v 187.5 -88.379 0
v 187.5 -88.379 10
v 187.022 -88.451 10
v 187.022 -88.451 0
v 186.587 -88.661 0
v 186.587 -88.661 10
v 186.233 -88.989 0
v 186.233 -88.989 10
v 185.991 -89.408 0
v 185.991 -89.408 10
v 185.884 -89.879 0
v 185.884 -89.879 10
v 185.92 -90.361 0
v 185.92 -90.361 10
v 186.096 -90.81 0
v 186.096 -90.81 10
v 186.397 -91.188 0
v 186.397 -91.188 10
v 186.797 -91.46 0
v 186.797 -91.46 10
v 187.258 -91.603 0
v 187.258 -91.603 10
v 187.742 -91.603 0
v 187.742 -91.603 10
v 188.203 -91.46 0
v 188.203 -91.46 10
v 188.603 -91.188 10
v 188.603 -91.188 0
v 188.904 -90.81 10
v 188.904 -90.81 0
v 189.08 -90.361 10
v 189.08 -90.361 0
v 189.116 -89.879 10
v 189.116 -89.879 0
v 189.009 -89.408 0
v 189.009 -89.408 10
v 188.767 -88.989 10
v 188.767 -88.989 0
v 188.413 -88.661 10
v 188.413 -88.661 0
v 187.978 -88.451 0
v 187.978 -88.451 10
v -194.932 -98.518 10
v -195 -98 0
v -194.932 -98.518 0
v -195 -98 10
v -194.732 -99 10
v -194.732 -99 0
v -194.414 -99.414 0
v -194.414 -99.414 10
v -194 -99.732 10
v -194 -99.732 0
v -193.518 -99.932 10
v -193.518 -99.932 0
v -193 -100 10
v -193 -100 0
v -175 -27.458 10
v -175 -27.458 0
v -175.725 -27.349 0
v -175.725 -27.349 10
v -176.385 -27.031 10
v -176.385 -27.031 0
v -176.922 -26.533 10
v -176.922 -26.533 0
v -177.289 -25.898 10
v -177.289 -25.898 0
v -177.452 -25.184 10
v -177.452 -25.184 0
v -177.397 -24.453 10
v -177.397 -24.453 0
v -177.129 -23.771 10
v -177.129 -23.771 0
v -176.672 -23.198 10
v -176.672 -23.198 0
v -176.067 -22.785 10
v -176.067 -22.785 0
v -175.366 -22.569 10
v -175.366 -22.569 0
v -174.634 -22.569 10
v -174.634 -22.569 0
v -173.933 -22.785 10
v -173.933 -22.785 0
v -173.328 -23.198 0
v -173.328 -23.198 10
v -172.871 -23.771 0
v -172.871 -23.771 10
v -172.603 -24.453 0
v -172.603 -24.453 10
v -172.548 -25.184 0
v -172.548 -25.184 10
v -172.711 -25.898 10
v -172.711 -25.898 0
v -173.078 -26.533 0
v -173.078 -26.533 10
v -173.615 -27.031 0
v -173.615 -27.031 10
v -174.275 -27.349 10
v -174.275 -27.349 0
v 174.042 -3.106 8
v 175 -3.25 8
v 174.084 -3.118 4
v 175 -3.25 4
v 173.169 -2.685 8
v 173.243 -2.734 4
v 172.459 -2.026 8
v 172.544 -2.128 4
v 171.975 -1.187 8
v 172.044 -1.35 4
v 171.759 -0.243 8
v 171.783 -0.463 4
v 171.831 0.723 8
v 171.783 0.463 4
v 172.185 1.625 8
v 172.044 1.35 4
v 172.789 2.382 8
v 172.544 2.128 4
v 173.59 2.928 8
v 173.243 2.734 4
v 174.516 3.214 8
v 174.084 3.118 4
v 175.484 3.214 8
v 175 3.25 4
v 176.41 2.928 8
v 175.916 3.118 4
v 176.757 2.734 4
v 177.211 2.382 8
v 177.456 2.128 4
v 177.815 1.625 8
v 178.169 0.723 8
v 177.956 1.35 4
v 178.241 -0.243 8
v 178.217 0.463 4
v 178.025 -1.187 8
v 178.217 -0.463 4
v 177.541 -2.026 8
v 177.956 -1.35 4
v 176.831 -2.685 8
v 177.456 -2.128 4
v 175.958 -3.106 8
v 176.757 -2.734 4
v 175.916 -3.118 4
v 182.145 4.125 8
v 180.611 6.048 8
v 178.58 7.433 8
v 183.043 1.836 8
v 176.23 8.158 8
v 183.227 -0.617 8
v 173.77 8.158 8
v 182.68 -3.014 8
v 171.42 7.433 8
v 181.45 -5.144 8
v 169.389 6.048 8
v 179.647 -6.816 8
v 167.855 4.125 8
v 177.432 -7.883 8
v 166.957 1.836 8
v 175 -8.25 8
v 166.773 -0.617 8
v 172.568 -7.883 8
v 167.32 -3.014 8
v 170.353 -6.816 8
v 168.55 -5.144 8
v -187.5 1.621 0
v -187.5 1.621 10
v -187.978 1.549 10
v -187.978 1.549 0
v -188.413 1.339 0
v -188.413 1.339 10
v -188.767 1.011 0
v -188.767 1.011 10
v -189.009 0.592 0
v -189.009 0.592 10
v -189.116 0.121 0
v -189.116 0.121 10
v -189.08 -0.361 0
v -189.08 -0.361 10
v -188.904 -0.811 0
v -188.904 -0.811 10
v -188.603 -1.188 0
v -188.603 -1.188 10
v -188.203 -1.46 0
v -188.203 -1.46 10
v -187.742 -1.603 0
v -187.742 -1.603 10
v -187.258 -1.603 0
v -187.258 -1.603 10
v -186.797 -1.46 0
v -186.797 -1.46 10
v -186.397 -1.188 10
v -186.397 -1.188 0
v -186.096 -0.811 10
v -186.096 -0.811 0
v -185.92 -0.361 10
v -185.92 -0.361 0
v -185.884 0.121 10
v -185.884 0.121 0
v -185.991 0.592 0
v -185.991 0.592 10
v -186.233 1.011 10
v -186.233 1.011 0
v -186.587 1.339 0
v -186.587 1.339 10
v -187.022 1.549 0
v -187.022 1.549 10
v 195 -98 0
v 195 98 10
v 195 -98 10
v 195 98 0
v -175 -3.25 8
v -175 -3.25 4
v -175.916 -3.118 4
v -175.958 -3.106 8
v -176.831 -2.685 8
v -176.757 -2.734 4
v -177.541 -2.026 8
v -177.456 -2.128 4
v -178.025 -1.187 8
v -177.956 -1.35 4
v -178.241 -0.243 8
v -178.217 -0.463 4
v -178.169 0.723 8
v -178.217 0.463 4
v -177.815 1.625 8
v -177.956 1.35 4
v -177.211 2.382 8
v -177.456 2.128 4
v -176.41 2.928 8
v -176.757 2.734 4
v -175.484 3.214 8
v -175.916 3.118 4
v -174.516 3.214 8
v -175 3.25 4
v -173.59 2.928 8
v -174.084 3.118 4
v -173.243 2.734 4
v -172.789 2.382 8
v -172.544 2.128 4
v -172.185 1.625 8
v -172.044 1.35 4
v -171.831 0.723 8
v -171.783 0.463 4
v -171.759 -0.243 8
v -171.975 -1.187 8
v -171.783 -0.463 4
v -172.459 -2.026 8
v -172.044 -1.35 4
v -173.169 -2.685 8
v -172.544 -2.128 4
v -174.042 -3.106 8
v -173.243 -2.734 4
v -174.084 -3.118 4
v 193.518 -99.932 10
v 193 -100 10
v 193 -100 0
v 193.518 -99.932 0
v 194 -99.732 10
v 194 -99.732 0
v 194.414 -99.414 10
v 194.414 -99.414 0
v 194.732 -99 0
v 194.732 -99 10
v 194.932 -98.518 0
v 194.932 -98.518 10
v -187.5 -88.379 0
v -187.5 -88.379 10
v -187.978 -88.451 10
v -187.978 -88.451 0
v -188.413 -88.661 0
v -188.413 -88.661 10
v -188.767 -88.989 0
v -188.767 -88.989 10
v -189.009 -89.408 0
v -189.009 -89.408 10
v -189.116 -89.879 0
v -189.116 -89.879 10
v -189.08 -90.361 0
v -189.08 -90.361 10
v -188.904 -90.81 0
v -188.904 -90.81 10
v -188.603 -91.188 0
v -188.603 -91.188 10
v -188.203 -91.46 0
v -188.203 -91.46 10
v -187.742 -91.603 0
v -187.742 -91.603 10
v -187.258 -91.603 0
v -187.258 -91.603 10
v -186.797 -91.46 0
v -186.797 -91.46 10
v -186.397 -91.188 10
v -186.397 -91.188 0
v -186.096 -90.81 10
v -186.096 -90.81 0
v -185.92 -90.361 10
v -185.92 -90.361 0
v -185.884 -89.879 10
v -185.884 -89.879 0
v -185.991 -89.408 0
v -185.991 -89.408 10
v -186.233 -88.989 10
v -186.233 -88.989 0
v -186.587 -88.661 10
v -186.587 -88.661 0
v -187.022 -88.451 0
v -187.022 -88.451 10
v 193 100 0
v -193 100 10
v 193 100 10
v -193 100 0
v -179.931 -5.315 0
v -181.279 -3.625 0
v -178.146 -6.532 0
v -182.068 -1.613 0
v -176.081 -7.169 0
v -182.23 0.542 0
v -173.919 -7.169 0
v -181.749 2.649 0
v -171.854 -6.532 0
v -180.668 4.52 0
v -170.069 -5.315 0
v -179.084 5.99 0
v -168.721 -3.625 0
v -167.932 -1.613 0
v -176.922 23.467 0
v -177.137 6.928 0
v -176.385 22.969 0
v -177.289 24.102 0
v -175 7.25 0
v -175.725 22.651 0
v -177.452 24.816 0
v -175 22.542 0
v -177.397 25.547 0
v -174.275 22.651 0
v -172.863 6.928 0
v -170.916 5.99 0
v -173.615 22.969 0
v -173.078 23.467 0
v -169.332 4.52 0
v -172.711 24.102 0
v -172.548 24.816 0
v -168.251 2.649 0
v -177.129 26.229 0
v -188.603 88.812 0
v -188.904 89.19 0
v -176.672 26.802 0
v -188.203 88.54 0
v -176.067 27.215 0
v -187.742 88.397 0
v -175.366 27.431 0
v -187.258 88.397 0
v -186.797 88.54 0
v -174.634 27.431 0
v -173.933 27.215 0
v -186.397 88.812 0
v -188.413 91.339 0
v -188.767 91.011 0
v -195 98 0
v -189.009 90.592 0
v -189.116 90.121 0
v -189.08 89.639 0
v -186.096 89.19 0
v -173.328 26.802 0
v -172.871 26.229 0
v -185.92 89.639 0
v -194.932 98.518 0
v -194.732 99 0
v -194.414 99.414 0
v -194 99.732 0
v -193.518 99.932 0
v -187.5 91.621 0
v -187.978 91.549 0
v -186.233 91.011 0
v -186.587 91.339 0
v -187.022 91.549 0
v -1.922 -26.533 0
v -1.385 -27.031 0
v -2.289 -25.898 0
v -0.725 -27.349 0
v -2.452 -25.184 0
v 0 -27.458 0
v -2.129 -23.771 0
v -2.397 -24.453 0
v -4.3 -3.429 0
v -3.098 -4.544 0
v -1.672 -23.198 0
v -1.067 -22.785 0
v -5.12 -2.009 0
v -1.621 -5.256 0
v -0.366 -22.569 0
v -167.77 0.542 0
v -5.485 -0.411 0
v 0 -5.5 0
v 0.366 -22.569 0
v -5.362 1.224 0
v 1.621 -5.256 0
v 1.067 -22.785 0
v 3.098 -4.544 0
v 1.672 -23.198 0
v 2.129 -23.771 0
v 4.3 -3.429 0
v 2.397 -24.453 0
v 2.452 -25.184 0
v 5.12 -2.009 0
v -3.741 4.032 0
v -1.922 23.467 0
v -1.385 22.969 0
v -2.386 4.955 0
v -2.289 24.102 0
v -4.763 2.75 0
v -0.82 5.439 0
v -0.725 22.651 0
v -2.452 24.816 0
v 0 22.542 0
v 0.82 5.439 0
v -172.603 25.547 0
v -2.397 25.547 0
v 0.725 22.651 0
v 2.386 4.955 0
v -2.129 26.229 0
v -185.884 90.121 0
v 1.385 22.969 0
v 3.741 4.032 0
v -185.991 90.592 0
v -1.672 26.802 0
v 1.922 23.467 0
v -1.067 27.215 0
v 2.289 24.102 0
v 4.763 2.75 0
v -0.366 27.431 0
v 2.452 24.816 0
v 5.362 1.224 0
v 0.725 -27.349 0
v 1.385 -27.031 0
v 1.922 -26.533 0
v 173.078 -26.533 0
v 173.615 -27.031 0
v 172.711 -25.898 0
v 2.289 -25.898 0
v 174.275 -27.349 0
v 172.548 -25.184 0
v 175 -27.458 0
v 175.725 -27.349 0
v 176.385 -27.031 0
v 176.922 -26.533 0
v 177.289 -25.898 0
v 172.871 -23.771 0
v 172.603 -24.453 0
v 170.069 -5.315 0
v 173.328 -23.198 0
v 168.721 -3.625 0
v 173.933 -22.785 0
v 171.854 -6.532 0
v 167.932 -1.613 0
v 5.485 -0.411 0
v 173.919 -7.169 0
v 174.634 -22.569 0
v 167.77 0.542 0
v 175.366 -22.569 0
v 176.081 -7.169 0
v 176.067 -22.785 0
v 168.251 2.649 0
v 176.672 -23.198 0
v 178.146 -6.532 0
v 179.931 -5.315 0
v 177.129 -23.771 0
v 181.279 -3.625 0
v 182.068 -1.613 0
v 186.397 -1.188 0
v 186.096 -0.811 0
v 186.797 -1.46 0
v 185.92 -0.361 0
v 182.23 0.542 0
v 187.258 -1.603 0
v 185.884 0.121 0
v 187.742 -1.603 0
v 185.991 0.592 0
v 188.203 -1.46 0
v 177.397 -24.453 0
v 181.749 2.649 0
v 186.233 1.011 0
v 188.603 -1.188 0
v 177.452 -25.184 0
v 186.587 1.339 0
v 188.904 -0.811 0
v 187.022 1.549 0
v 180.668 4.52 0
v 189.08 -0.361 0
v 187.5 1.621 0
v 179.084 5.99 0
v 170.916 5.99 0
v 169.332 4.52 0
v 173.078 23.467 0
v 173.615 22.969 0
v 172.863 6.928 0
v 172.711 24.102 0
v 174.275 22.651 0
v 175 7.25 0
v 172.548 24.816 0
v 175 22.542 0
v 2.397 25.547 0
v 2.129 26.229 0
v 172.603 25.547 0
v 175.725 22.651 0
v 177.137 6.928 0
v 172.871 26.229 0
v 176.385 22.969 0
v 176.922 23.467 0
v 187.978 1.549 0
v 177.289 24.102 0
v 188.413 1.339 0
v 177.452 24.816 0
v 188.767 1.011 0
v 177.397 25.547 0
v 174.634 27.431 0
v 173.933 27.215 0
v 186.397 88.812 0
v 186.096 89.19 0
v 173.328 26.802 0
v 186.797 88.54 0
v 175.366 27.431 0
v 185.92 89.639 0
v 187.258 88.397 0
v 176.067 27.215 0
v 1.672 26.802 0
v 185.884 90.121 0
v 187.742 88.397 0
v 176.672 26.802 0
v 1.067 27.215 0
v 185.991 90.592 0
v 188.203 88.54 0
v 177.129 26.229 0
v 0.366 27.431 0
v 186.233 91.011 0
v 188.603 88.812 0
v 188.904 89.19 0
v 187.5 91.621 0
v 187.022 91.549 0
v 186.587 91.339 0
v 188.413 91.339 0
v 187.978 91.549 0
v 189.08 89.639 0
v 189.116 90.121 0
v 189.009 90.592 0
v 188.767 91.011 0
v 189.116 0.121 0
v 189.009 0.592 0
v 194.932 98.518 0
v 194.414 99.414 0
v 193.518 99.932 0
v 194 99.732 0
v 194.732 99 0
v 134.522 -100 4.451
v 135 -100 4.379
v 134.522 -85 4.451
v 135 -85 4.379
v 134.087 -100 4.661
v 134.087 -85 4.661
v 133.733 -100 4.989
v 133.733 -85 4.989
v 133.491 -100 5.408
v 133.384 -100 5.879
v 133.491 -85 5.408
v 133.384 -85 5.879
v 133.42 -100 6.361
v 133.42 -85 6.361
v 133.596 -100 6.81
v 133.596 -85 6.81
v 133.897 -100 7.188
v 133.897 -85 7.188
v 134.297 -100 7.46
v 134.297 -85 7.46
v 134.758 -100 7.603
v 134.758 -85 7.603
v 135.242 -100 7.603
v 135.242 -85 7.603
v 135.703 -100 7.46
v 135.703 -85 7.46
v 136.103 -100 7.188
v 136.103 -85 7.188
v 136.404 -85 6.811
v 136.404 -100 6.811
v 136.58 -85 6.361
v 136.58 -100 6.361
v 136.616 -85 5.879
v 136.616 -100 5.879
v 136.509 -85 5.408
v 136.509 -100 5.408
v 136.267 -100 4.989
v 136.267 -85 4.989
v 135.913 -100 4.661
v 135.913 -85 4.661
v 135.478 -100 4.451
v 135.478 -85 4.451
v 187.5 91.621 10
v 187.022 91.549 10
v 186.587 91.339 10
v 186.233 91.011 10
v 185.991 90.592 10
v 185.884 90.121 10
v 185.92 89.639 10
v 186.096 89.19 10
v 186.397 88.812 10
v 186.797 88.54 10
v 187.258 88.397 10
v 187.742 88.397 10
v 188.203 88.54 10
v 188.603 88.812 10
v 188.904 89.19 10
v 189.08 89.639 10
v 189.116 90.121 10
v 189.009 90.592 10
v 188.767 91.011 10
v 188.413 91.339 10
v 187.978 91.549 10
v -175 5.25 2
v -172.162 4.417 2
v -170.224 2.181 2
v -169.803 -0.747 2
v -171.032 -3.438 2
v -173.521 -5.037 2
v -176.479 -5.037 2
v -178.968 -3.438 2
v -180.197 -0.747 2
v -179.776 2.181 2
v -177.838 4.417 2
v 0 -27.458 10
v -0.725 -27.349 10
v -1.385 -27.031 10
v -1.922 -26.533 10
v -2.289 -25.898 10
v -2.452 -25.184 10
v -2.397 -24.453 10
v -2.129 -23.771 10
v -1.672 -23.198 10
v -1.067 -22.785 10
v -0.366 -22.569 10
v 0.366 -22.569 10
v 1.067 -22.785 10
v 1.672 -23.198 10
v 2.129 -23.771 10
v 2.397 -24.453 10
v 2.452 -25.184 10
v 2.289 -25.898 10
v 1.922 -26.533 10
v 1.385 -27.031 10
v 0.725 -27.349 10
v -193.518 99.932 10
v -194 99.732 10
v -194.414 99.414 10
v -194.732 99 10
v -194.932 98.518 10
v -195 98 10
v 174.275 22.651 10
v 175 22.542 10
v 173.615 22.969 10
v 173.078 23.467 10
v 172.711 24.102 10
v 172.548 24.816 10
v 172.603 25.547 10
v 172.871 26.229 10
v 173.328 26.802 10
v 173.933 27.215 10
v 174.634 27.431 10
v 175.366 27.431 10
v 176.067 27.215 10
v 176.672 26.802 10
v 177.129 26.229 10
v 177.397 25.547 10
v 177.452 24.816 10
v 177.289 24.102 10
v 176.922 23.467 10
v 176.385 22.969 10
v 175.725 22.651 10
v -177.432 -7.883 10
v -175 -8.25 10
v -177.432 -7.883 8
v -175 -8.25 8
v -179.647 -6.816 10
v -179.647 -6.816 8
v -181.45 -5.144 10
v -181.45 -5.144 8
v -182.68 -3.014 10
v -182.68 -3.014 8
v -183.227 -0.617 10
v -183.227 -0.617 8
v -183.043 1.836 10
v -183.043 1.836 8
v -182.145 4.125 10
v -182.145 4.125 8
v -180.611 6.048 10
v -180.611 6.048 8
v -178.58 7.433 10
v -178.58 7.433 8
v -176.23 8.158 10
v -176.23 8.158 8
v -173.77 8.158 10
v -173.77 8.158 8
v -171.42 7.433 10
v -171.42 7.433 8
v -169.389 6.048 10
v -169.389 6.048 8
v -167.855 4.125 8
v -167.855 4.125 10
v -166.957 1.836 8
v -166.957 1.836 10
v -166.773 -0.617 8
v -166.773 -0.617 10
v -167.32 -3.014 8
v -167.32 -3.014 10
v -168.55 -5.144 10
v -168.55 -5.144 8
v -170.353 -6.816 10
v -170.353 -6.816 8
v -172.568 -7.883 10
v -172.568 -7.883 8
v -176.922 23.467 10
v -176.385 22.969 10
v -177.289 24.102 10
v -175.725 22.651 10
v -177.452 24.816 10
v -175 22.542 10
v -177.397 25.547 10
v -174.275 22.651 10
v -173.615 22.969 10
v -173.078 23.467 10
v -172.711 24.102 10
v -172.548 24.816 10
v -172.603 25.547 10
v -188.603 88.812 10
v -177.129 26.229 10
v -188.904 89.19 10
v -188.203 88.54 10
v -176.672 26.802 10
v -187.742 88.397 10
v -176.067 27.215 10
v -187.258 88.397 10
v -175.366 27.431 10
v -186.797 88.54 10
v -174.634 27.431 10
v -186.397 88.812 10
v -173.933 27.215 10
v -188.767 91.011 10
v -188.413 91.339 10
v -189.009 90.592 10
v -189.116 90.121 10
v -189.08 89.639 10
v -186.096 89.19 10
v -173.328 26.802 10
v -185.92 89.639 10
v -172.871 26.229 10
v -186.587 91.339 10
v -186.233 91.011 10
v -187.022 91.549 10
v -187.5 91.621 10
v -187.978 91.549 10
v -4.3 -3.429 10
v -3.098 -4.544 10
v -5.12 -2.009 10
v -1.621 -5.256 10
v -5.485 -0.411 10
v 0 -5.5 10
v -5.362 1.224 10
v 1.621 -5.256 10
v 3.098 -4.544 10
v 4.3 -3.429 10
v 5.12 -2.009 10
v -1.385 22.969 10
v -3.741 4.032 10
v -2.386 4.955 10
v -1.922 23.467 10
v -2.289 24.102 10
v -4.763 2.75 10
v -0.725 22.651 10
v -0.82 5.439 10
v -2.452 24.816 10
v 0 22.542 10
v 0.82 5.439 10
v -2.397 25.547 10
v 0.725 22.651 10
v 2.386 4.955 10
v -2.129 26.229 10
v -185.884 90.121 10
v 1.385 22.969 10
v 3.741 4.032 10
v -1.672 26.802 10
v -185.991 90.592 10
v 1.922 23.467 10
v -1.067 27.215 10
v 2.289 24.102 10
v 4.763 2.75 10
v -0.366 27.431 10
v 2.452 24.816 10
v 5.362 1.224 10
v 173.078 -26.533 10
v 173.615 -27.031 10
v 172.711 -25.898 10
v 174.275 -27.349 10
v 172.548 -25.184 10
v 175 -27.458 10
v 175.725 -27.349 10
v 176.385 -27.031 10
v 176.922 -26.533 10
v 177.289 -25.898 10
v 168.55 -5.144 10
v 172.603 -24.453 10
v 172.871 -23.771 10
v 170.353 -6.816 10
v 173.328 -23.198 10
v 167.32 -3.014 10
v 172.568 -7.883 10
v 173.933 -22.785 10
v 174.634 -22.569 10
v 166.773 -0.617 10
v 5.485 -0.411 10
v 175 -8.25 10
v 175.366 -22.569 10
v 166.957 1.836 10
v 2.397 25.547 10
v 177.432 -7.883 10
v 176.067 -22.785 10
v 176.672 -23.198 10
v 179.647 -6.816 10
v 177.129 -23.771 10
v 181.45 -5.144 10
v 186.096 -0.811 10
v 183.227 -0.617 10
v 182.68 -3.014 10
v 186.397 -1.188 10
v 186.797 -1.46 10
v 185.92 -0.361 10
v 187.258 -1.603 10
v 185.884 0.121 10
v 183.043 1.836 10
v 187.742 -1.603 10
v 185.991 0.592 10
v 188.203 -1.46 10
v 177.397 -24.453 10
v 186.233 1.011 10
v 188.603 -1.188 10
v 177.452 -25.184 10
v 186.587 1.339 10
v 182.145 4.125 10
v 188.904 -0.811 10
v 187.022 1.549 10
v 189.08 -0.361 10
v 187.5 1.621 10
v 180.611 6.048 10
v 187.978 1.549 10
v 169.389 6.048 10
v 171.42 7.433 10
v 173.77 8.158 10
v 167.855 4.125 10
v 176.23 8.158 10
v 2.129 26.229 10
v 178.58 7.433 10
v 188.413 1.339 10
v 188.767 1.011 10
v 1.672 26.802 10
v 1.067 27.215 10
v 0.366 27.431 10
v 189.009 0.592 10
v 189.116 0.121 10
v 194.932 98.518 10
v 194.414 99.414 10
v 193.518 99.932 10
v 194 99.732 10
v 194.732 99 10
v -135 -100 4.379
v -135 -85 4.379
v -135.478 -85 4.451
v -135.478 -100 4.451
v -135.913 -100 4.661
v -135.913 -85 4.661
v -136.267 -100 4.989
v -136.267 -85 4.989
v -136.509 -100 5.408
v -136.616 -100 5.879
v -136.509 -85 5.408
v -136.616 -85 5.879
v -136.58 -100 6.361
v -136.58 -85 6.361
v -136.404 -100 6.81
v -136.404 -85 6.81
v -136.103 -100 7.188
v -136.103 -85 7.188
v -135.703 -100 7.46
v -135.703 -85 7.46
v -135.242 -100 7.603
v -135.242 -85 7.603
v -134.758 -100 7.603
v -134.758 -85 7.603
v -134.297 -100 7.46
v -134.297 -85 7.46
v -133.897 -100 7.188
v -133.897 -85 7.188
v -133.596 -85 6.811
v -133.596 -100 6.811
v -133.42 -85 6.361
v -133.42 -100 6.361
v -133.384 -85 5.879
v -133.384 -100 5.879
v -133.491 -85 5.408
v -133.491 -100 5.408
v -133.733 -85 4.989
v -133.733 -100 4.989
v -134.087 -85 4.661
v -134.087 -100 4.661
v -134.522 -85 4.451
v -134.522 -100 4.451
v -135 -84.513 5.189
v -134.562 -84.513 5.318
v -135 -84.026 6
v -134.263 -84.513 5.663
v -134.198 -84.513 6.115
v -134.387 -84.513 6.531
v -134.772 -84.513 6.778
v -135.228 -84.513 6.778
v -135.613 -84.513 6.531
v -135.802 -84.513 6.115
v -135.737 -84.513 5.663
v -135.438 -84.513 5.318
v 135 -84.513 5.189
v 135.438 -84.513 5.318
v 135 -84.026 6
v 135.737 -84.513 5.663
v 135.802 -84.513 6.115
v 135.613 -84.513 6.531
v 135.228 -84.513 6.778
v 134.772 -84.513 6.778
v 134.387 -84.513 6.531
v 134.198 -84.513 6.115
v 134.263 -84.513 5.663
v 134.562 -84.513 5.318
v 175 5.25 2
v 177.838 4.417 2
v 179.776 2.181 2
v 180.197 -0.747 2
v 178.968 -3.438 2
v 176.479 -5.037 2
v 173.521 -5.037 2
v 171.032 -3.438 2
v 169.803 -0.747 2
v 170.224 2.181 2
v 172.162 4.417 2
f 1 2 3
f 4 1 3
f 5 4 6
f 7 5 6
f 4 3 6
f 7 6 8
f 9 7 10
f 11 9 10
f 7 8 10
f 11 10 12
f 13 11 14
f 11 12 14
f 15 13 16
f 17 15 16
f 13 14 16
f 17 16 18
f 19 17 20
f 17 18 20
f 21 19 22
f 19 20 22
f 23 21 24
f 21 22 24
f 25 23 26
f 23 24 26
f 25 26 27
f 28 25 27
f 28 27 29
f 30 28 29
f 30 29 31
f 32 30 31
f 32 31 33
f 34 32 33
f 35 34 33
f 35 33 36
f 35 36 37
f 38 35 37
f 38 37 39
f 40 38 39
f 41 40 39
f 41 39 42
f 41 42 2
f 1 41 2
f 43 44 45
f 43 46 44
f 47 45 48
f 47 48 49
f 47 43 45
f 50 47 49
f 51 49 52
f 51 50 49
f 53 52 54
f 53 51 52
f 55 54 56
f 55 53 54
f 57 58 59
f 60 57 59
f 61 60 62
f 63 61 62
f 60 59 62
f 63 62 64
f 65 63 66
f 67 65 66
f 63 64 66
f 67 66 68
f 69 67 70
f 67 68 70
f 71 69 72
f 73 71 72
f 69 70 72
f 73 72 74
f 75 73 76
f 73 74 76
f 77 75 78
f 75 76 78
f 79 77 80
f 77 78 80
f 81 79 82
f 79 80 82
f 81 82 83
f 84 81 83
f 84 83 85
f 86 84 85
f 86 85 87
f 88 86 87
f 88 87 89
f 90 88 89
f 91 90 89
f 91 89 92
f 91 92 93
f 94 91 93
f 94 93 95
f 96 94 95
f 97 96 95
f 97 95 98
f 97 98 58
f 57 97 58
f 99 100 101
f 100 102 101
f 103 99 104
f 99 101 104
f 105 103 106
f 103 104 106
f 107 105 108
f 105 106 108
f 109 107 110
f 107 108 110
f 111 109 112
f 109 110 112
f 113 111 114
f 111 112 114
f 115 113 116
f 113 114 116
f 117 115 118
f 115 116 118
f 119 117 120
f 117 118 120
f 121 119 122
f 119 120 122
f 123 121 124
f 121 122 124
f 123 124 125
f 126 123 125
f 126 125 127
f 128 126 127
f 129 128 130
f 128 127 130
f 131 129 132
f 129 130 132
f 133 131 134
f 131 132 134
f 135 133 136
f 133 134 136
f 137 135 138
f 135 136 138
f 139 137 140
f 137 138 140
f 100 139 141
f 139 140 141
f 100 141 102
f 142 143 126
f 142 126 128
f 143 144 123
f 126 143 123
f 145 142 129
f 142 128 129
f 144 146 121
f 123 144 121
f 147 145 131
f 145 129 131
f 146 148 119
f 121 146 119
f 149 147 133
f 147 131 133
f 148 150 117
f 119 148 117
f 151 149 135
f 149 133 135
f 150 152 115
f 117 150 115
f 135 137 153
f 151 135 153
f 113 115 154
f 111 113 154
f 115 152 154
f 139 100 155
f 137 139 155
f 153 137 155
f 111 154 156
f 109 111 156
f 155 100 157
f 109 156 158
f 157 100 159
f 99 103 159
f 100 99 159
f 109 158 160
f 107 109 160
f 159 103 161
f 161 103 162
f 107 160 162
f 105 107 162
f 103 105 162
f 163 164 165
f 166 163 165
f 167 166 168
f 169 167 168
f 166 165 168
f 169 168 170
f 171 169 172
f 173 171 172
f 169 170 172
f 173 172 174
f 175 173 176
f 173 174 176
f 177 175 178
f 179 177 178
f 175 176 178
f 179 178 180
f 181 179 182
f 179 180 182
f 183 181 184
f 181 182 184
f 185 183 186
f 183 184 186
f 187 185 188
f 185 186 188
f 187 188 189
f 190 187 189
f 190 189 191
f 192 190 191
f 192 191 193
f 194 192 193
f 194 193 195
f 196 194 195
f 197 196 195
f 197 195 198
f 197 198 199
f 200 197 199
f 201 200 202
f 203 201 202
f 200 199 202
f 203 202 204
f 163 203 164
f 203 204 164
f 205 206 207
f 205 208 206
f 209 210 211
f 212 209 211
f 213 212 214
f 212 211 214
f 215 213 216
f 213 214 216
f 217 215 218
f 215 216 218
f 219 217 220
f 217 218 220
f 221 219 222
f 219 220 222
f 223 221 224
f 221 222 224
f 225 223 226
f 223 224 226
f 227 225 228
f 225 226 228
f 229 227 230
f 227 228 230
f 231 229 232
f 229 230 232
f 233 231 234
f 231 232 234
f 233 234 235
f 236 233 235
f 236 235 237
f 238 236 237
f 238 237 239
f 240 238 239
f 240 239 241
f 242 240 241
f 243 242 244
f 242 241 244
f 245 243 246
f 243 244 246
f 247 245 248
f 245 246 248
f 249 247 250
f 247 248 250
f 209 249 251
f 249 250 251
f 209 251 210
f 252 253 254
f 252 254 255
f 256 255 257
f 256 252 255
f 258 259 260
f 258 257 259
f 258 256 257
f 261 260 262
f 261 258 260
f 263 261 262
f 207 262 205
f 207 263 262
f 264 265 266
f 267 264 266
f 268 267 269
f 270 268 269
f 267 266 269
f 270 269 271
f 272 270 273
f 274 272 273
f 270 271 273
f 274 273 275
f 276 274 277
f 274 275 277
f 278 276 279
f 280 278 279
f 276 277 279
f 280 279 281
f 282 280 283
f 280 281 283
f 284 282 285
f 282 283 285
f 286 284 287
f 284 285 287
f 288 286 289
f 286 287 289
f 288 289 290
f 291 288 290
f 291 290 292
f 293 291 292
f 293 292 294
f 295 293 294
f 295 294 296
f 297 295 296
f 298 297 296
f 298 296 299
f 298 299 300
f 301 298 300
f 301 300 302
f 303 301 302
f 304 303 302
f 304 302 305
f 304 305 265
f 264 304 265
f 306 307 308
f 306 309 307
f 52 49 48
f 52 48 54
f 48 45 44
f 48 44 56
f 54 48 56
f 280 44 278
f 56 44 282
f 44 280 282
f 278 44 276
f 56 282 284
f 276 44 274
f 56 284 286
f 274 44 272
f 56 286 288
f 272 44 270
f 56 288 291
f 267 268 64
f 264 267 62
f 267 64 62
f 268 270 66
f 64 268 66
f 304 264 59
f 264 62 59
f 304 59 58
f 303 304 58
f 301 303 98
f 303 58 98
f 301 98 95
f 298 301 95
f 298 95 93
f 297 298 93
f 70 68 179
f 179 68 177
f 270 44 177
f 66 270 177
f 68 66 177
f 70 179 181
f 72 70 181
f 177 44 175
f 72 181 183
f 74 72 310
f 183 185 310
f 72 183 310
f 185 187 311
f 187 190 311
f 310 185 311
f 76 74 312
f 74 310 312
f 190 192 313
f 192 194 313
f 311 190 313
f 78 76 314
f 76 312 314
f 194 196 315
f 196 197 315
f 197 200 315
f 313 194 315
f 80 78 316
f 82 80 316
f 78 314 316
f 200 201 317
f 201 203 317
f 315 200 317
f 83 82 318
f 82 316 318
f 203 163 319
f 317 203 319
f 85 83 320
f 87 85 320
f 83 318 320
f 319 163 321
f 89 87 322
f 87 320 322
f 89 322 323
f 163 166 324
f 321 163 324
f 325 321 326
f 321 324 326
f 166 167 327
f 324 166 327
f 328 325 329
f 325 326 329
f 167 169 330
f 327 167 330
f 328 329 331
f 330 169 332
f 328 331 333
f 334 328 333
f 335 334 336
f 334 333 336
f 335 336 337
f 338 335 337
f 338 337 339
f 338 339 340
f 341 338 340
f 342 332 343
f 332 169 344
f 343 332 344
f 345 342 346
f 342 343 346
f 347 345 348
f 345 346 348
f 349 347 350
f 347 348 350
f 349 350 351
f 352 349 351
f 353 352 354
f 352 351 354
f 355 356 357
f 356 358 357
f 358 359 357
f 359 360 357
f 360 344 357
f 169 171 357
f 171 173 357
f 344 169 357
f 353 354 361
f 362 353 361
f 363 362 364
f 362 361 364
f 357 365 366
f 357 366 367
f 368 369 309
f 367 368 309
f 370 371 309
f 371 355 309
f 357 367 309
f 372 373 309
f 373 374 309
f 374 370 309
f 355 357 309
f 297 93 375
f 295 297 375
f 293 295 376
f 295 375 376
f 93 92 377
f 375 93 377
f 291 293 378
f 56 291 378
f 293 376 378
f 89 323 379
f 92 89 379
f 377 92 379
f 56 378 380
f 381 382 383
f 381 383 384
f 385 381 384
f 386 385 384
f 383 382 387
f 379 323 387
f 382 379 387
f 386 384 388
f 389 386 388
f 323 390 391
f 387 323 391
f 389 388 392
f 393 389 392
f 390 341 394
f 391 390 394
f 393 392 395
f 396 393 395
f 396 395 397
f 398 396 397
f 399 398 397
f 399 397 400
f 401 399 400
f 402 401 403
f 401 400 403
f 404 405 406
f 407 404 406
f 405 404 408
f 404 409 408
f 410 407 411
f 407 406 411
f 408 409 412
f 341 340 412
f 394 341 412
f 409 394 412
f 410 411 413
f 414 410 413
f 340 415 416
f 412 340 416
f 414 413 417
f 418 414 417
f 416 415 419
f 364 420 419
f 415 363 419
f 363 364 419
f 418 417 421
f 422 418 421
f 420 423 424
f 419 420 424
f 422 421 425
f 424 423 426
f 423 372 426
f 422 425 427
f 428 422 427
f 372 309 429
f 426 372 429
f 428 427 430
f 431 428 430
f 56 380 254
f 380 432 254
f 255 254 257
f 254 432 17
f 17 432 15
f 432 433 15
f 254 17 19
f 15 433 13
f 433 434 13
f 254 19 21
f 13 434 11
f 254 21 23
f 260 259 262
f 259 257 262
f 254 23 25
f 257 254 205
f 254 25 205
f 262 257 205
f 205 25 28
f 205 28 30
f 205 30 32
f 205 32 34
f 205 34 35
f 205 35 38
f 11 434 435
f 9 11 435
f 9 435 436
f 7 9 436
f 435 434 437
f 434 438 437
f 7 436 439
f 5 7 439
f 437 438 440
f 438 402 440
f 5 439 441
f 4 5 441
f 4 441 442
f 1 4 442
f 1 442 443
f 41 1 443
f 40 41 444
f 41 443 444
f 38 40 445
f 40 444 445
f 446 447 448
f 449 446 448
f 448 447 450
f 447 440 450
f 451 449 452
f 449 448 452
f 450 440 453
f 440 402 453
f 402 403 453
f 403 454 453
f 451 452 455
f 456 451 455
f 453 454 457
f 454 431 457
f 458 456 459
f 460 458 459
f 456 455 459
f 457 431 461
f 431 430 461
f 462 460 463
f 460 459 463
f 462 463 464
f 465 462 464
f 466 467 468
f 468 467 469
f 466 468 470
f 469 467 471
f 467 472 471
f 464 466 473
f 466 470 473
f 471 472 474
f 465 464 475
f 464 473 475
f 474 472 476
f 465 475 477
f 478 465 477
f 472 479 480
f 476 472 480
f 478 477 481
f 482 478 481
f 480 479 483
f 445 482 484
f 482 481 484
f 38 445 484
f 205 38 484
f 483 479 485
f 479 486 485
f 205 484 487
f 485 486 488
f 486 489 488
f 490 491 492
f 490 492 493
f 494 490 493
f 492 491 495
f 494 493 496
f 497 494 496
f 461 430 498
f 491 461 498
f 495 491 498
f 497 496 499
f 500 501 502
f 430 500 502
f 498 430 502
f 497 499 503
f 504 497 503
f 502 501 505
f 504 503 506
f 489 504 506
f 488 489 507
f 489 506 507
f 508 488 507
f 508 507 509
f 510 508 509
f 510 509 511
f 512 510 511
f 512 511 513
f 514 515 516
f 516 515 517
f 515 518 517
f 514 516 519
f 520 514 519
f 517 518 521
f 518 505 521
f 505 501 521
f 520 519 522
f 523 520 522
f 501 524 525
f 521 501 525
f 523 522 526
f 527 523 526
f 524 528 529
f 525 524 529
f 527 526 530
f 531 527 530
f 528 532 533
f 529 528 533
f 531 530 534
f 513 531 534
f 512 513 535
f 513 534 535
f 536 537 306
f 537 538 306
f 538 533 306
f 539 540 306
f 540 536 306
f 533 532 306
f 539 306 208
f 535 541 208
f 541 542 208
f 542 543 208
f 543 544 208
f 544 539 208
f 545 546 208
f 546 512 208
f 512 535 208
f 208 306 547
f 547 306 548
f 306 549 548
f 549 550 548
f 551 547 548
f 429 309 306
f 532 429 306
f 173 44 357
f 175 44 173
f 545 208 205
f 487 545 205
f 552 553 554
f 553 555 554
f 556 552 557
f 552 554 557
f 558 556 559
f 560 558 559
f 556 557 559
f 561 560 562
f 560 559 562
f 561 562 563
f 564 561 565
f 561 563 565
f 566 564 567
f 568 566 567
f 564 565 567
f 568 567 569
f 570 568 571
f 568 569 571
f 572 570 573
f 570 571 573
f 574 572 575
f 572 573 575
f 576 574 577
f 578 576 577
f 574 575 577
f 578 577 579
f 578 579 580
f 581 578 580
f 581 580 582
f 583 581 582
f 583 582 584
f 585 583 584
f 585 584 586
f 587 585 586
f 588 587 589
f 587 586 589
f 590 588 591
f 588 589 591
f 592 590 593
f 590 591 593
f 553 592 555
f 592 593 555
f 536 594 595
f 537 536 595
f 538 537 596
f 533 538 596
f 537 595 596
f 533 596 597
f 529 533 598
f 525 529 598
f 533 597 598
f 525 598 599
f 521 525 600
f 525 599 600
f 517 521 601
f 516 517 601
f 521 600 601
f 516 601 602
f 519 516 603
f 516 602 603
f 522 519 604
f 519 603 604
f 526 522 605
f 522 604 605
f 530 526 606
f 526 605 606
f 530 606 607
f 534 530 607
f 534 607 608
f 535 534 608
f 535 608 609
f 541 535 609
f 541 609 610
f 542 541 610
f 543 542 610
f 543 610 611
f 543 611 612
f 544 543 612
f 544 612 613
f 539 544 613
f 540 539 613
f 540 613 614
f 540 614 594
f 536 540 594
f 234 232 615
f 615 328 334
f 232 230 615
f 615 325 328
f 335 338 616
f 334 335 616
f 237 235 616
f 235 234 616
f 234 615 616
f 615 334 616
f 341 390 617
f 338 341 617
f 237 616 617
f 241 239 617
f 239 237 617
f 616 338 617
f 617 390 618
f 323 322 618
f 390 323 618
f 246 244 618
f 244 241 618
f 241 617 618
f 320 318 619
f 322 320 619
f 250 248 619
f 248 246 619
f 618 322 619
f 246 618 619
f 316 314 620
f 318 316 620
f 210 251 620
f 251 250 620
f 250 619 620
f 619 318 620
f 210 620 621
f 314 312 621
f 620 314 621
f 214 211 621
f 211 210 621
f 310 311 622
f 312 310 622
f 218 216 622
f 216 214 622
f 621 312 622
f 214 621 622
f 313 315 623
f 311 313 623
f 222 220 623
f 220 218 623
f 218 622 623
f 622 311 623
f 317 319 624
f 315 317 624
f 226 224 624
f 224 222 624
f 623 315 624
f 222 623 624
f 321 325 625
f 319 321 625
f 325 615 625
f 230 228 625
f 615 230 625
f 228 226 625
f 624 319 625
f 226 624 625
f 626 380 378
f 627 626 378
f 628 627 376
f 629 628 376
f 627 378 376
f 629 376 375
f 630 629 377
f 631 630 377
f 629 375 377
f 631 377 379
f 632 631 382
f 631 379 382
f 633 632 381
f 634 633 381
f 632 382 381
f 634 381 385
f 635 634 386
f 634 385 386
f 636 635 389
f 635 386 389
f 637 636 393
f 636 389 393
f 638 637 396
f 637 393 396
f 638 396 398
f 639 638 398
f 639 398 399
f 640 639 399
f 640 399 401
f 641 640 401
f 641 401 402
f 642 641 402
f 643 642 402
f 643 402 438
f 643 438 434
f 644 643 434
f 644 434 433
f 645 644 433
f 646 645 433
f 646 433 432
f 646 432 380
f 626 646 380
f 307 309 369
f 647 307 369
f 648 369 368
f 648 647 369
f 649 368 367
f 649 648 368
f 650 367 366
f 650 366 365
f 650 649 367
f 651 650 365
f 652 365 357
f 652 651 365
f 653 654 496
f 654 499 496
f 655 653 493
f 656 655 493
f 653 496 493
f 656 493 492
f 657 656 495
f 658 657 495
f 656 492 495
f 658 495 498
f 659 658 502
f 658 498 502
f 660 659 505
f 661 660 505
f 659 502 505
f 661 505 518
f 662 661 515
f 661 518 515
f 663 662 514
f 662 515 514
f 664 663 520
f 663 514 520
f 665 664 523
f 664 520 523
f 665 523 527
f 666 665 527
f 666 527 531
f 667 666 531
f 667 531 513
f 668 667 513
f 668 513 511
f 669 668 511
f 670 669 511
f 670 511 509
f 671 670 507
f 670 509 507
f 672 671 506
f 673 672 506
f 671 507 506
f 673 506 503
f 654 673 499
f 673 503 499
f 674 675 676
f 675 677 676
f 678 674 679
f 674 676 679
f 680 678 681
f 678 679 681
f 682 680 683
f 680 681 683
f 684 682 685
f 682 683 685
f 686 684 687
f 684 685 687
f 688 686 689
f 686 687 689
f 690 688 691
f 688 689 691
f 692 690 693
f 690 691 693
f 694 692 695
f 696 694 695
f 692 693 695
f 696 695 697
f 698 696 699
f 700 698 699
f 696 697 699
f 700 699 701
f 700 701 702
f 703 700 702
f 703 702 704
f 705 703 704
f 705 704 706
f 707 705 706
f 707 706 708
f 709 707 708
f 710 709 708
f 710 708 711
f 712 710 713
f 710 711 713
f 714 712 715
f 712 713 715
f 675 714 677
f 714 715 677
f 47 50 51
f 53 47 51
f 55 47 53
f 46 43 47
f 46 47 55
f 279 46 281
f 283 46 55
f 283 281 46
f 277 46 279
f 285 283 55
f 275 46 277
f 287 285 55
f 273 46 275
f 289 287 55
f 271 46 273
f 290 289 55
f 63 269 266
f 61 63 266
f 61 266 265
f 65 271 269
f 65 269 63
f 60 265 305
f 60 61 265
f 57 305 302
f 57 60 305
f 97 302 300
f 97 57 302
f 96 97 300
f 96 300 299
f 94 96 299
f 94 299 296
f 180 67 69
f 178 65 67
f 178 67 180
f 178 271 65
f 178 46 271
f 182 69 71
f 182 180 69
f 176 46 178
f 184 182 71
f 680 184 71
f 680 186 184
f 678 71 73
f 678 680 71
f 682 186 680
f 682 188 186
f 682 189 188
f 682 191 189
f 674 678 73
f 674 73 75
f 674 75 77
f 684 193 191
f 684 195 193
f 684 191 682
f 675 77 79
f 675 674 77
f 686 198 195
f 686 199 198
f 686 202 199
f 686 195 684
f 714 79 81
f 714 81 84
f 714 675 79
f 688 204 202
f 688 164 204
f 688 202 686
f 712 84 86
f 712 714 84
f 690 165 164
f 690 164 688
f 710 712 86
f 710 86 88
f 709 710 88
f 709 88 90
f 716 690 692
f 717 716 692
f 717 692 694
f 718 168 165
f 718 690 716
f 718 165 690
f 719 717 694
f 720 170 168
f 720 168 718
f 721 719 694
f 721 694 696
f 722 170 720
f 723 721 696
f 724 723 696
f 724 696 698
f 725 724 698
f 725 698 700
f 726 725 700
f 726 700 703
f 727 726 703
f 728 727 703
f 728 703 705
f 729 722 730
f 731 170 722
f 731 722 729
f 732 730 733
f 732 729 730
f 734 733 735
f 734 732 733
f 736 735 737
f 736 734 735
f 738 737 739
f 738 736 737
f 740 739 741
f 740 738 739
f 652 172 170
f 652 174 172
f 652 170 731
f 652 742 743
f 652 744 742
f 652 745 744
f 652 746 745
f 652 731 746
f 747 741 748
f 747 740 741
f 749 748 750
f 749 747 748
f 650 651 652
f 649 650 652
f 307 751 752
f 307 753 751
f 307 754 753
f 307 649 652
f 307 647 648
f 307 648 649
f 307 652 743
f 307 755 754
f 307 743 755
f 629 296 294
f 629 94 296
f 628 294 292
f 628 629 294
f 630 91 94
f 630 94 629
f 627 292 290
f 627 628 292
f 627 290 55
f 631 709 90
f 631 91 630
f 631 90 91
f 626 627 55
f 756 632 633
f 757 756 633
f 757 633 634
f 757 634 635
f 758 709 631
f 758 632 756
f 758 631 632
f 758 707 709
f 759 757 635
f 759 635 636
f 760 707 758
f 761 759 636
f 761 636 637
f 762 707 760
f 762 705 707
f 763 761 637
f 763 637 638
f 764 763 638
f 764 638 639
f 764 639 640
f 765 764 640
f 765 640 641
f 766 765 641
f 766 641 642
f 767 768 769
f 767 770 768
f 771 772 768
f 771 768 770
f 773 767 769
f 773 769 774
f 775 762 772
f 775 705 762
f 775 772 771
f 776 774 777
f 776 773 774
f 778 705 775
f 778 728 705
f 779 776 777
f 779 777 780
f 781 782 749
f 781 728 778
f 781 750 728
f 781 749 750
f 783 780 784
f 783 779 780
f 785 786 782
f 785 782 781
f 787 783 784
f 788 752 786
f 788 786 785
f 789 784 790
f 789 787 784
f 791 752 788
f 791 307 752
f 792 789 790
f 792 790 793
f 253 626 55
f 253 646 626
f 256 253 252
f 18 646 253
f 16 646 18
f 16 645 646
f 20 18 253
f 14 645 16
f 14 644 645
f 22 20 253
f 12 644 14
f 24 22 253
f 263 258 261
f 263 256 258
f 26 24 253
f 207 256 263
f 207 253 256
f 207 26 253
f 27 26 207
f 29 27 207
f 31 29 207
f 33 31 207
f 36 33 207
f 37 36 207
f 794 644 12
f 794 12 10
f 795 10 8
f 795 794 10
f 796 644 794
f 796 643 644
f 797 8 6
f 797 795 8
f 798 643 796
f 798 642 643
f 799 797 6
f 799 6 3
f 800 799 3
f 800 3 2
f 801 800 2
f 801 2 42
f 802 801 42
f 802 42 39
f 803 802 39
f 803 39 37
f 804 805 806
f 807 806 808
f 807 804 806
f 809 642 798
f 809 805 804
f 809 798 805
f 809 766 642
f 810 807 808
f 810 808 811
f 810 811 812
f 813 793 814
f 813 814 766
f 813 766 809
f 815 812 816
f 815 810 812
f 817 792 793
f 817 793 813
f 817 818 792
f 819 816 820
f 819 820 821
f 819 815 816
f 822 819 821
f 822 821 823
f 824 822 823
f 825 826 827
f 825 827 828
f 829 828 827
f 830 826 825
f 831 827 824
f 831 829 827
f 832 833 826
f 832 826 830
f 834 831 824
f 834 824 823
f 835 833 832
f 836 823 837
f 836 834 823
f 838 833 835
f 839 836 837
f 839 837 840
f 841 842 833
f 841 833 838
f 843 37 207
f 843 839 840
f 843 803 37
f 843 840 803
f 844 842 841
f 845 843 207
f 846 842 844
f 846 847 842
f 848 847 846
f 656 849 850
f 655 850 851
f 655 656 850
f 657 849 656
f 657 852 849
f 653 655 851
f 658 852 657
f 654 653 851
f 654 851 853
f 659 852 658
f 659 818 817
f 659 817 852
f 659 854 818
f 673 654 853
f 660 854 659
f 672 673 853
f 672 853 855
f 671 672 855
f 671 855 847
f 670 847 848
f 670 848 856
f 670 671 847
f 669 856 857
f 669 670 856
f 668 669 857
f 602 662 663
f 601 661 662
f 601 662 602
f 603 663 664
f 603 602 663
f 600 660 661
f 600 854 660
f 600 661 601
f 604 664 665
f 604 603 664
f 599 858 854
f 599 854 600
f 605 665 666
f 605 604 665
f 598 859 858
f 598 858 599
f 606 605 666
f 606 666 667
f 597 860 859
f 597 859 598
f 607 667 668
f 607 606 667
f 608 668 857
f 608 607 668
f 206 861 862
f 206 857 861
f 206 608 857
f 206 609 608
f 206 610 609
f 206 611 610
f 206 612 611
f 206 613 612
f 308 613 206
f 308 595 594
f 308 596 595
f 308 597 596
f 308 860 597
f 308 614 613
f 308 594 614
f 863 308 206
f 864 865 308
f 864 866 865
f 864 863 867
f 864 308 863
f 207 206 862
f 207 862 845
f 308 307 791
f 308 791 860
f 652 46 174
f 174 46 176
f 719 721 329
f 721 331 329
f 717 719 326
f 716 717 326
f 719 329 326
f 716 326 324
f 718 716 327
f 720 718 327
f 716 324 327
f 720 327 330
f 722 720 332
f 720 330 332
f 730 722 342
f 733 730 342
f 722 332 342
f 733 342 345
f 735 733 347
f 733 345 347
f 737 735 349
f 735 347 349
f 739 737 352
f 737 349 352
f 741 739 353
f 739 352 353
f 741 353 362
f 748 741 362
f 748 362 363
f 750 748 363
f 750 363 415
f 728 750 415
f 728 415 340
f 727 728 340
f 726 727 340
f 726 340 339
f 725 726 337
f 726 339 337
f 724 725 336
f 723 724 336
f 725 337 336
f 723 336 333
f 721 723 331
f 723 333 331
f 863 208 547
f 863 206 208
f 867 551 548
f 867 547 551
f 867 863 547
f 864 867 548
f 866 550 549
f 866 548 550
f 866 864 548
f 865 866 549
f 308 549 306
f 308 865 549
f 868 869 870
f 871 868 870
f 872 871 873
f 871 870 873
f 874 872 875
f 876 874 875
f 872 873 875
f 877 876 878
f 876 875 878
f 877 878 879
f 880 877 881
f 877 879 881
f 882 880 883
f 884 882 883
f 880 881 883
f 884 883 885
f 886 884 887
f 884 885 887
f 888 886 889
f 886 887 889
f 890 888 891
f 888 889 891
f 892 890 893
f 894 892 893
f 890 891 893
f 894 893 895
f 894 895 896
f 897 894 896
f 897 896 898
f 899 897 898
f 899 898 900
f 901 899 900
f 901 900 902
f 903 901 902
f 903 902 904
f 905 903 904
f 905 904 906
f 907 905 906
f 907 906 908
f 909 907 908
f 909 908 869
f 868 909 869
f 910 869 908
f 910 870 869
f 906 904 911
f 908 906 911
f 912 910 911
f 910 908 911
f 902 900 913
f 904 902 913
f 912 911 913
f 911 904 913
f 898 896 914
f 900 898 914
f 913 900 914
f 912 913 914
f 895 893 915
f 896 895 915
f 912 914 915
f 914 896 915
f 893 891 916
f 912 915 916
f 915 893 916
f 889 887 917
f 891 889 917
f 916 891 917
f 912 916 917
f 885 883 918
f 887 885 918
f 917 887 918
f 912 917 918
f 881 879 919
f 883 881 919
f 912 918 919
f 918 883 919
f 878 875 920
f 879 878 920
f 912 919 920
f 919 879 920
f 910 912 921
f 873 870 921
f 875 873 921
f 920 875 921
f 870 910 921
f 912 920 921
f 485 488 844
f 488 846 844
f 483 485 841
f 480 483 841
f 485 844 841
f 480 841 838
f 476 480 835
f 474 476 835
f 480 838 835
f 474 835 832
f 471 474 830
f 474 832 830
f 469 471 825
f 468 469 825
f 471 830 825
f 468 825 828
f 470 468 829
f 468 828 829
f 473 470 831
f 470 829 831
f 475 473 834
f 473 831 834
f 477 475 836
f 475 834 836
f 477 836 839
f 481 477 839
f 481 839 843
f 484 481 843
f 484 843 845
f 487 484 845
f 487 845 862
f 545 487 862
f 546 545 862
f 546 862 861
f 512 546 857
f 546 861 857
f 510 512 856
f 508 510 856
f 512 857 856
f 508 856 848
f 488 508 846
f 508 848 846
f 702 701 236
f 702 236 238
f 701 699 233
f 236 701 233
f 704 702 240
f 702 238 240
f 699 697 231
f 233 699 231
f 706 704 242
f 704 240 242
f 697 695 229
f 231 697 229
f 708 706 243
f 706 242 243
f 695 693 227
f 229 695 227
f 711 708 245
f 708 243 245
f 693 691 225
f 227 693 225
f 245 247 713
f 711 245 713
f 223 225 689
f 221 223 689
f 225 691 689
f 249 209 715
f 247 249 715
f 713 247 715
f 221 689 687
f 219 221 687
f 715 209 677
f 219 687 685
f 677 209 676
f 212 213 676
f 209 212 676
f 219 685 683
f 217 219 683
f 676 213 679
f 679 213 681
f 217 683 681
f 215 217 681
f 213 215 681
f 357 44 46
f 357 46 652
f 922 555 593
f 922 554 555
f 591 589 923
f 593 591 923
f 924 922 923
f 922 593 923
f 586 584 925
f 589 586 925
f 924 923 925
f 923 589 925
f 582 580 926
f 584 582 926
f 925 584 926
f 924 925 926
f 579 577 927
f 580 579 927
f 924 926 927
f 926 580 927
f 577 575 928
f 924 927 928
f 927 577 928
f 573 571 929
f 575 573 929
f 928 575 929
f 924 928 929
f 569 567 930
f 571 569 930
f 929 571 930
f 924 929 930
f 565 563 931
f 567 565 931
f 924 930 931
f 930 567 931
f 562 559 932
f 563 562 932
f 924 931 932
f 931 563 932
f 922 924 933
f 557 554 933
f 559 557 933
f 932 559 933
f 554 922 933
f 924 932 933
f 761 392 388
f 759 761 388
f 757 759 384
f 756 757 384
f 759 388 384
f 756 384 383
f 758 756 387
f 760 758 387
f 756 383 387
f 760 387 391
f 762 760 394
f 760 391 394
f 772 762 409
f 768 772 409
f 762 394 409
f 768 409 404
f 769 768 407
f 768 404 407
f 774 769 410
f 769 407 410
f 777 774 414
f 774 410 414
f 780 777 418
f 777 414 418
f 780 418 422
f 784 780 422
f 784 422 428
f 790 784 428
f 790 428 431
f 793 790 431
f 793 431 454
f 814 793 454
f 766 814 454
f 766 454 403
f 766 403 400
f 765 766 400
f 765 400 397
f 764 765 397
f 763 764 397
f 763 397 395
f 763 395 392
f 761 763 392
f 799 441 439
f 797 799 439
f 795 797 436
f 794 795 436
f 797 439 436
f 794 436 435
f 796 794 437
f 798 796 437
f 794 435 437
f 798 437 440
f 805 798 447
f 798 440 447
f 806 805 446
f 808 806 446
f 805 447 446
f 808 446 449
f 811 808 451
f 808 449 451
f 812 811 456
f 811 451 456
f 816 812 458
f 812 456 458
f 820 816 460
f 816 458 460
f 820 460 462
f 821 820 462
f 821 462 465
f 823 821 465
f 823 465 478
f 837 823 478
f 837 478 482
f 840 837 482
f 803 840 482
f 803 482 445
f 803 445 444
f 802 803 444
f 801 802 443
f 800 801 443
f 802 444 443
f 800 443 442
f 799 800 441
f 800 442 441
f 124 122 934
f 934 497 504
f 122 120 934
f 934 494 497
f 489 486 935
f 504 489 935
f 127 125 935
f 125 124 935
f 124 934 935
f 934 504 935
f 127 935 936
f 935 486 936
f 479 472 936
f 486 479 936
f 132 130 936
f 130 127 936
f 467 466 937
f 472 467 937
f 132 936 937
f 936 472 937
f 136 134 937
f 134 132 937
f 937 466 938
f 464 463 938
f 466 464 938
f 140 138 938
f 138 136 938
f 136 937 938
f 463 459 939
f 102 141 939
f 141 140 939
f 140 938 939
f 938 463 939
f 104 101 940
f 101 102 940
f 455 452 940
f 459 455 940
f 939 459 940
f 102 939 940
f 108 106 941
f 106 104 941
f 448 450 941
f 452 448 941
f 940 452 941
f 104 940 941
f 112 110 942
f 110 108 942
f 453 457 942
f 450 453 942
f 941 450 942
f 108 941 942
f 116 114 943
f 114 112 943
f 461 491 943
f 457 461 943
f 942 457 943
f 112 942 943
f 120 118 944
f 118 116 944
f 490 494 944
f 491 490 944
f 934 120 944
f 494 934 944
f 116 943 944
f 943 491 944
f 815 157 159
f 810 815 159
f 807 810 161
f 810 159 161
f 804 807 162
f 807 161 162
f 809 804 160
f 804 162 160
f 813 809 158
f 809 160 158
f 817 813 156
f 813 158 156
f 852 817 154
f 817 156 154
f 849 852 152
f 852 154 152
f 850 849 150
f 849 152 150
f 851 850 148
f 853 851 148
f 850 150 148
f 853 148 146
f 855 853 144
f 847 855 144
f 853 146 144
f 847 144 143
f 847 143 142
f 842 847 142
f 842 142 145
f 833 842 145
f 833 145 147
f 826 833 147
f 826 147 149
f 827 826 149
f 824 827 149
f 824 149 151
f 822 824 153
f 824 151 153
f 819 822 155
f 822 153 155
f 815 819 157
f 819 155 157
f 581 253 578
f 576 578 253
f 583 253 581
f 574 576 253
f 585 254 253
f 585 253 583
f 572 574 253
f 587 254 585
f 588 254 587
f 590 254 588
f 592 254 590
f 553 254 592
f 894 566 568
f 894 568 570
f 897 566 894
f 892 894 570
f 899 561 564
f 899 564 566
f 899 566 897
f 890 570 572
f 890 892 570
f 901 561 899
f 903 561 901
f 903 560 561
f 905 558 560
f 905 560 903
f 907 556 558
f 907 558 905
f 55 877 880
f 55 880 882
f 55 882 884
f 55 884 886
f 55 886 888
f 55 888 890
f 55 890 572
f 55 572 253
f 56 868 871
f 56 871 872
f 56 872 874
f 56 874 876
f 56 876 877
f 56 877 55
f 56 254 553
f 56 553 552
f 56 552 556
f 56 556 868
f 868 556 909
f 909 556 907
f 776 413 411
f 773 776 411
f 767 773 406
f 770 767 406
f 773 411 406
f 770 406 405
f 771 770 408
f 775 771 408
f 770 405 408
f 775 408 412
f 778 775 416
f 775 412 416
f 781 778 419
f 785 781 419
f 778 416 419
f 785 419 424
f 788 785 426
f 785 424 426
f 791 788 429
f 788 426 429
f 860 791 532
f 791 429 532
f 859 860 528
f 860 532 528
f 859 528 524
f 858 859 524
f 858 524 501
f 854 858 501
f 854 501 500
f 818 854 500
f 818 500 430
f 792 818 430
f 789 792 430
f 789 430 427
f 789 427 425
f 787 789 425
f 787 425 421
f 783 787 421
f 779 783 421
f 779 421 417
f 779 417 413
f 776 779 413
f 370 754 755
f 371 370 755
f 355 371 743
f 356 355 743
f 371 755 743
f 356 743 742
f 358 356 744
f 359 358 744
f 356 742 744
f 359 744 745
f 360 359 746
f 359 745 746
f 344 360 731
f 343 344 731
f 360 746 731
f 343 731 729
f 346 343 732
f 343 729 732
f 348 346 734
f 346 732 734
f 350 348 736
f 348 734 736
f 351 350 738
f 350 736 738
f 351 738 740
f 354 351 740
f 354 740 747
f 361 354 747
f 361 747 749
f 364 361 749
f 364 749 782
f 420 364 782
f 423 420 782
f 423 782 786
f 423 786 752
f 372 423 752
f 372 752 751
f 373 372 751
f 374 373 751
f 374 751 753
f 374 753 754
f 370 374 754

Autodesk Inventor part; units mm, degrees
ref_plane "YZ Plane" through (0, 0, 0) normal (1, 0, 0) x (0, 1, 0)
ref_plane "XZ Plane" through (0, 0, 0) normal (0, 1, 0) x (-1, 0, 0)
ref_plane "XY Plane" through (0, 0, 0) normal (0, 0, 1) x (1, 0, 0)
sketch "Sketch1" plane through (0, 0, 0) normal (0, 0, 1) x (1, 0, 0)
  line L0 (0, -252.5291) -> (0, 252.5291) construction
  line L1 (-273, 0) -> (273, 0) construction
  line L2 (-195, 100) -> (195, 100)
  line L3 (195, 100) -> (195, -100)
  line L4 (195, -100) -> (-195, -100)
  line L5 (-195, -100) -> (-195, 100)
  line L6 (-178.1654, -28.1654) -> (-178.1654, 28.1654) construction
  line L7 (-178.1654, 28.1654) -> (178.1654, 28.1654) construction
  line L8 (178.1654, 28.1654) -> (178.1654, -28.1654) construction
  line L9 (178.1654, -28.1654) -> (-178.1654, -28.1654) construction
  circle A0 centre (0, 0) radius 180.3779 construction
  line L10 (-175, 25) -> (-175, -25) construction
  line L11 (-175, -25) -> (175, -25) construction
  line L12 (175, -25) -> (175, 25) construction
  line L13 (175, 25) -> (-175, 25) construction
  circle A1 centre (-175, 0) radius 6 construction
  point P0 (175, 0)
  point P1 (0, 25)
  point P2 (0, -25)
  dimension "d0" = 390
  dimension "d1" = 200
  dimension "d5" = 350
  dimension "d6" = 360.7559
  dimension "d14" = 350
  dimension "d15" = 12
  dimension "d54" = 353.5534
  dimension "d104" = 350
  dimension "d105" = 50
extrude "Extrusion1" add sketch "Sketch1" along normal blind 10
sketch "Sketch2" plane through (0, 0, 10) normal (0, 0, 1) x (1, 0, 0)
  point P0 (0, 0)
  point P1 (-175, -25)
  point P2 (-175, 25)
  point P3 (175, 25)
  point P4 (175, -25)
  point P5 (-175, 0)
  point P6 (175, 0)
  point P7 (0, 25)
  point P8 (0, -25)
hole "Hole1" at (-175, -25, 10) at (175, 25, 10) at (-175, 25, 10) at (175, -25, 10) at (0, 25, 10) at (0, -25, 10) direction (0, 0, -1) diameter 4.917 end through all thread size "M6x1" class "6H" standard "ISO Metric profile"
hole "Hole2" at (-175, 0, 10) at (175, 0, 10) direction (0, 0, -1) diameter 6.5 end through all counterbore diameter 16.5 counterbore depth 2
sketch "Sketch3" plane through (0, 0, 10) normal (0, 0, 1) x (1, 0, 0)
  line L0 (195, 100) -> (-195, 100) construction
  line L1 (-195, -100) -> (195, -100) construction
  line L2 (-195, 100) -> (-195, -100) construction
  line L3 (-273, 0) -> (273, 0) construction
  line L4 (0, -140) -> (0, 140) construction
  line L5 (195, -100) -> (195, 100) construction
  line L6 (-180, 90) -> (180, 90) construction
  line L7 (180, 90) -> (180, -90) construction
  line L8 (180, -90) -> (-180, -90) construction
  line L9 (-180, -90) -> (-180, 90) construction
  point P0 (0, 0)
  point P1 (-170, 80)
  point P2 (-150, 80)
  point P3 (-150, 80)
  point P4 (-130, 80)
  point P5 (-110, 80)
  point P6 (-90, 80)
  point P7 (-70, 80)
  point P8 (-50, 80)
  point P9 (-30, 80)
  point P10 (-10, 80)
  point P11 (10, 80)
  point P12 (30, 80)
  point P13 (50, 80)
  point P14 (70, 80)
  point P15 (90, 80)
  point P16 (110, 80)
  point P17 (130, 80)
  point P18 (150, 80)
  point P19 (170, 80)
  point P20 (-170, 60)
  point P21 (-150, 60)
  point P22 (-130, 60)
  point P23 (-110, 60)
  point P24 (-90, 60)
  point P25 (-70, 60)
  point P26 (-50, 60)
  point P27 (-30, 60)
  point P28 (-10, 60)
  point P29 (10, 60)
  point P30 (30, 60)
  point P31 (50, 60)
  point P32 (70, 60)
  point P33 (90, 60)
  point P34 (110, 60)
  point P35 (130, 60)
  point P36 (150, 60)
  point P37 (170, 60)
  point P38 (-170, 40)
  point P39 (-150, 40)
  point P40 (-130, 40)
  point P41 (-110, 40)
  point P42 (-90, 40)
  point P43 (-70, 40)
  point P44 (-50, 40)
  point P45 (-30, 40)
  point P46 (-10, 40)
  point P47 (10, 40)
  point P48 (30, 40)
  point P49 (50, 40)
  point P50 (70, 40)
  point P51 (90, 40)
  point P52 (110, 40)
  point P53 (130, 40)
  point P54 (150, 40)
  point P55 (170, 40)
  point P56 (-170, 20)
  point P57 (-150, 20)
  point P58 (-130, 20)
  point P59 (-110, 20)
  point P60 (-90, 20)
  point P61 (-70, 20)
  point P62 (-50, 20)
  point P63 (-30, 20)
  point P64 (-10, 20)
  point P65 (10, 20)
  point P66 (30, 20)
  point P67 (50, 20)
  point P68 (70, 20)
  point P69 (90, 20)
  point P70 (110, 20)
  point P71 (130, 20)
  point P72 (150, 20)
  point P73 (170, 20)
  point P74 (-170, 0)
  point P75 (-150, 0)
  point P76 (-130, 0)
  point P77 (-110, 0)
  point P78 (-90, 0)
  point P79 (-70, 0)
  point P80 (-50, 0)
  point P81 (-30, 0)
  point P82 (-10, 0)
  point P83 (10, 0)
  point P84 (30, 0)
  point P85 (50, 0)
  point P86 (70, 0)
  point P87 (90, 0)
  point P88 (110, 0)
  point P89 (130, 0)
  point P90 (150, 0)
  point P91 (170, 0)
  point P92 (-170, -20)
  point P93 (-150, -20)
  point P94 (-130, -20)
  point P95 (-110, -20)
  point P96 (-90, -20)
  point P97 (-70, -20)
  point P98 (-50, -20)
  point P99 (-30, -20)
  point P100 (-10, -20)
  point P101 (10, -20)
  point P102 (30, -20)
  point P103 (50, -20)
  point P104 (70, -20)
  point P105 (90, -20)
  point P106 (110, -20)
  point P107 (130, -20)
  point P108 (150, -20)
  point P109 (170, -20)
  point P110 (-170, -40)
  point P111 (-150, -40)
  point P112 (-130, -40)
  point P113 (-110, -40)
  point P114 (-90, -40)
  point P115 (-70, -40)
  point P116 (-50, -40)
  point P117 (-30, -40)
  point P118 (-10, -40)
  point P119 (10, -40)
  point P120 (30, -40)
  point P121 (50, -40)
  point P122 (70, -40)
  point P123 (90, -40)
  point P124 (110, -40)
  point P125 (130, -40)
  point P126 (150, -40)
  point P127 (170, -40)
  point P128 (-170, -60)
  point P129 (-150, -60)
  point P130 (-130, -60)
  point P131 (-110, -60)
  point P132 (-90, -60)
  point P133 (-70, -60)
  point P134 (-50, -60)
  point P135 (-30, -60)
  point P136 (-10, -60)
  point P137 (10, -60)
  point P138 (30, -60)
  point P139 (50, -60)
  point P140 (70, -60)
  point P141 (90, -60)
  point P142 (110, -60)
  point P143 (130, -60)
  point P144 (150, -60)
  point P145 (170, -60)
  point P146 (-170, -80)
  point P147 (-150, -80)
  point P148 (-130, -80)
  point P149 (-110, -80)
  point P150 (-90, -80)
  point P151 (-70, -80)
  point P152 (-50, -80)
  point P153 (-30, -80)
  point P154 (-10, -80)
  point P155 (10, -80)
  point P156 (30, -80)
  point P157 (50, -80)
  point P158 (70, -80)
  point P159 (90, -80)
  point P160 (110, -80)
  point P161 (130, -80)
  point P162 (150, -80)
  point P163 (170, -80)
  dimension "d25" = 10
  dimension "d26" = 360
  dimension "d27" = 180
  dimension "d28" = 10
  dimension "d29" = 10
  dimension "d30" = 20
  dimension "d33" = 20
  dimension "d36" = 20
  dimension "d39" = 15
hole "Hole3" [suppressed]
hole "Hole4" at (0, 0, 10) direction (0, 0, -1) diameter 11 end through all
sketch "Sketch4" plane through (0, 0, 0) normal (0, 0, -1) x (-1, 0, 0)
  circle A0 centre (175, 0) radius 3.25 construction
  circle A1 centre (-175, 0) radius 3.25 construction
  line L0 (195, -100) -> (-195, -100) construction
  line L1 (187.5, -100) -> (187.5, 100) construction
  line L2 (-195, 100) -> (195, 100) construction
  line L3 (273, 0) -> (-273, 0) construction
  line L4 (0, -140) -> (0, 140) construction
  line L5 (195, 100) -> (195, -100) construction
  point P0 (0, 0)
  point P1 (187.5, -90)
  point P2 (187.5, 90)
  point P3 (187.5, 0)
  point P4 (-187.5, -90)
  point P5 (-187.5, 90)
  point P6 (-187.5, 0)
  dimension "d62" = 180
  dimension "d63" = 7.5
hole "Hole5" at (-175, 0, 0) at (175, 0, 0) direction (0, 0, 1) diameter 6.5 end through all countersink diameter 14.5 countersink angle 90 clearance for "Countersunk Flat Head Hex Socket Screw ISO 10642" size "M6" standard "ISO"
hole "Hole6" at (-187.5, -90, 0) at (-187.5, 90, 0) at (-187.5, 0, 0) at (187.5, -90, 0) at (187.5, 0, 0) at (187.5, 90, 0) direction (0, 0, 1) diameter 3.242 end through all thread size "M4x0.7" class "6H" standard "ISO Metric profile"
sketch "Sketch10" plane through (-195, -100, 0) normal (0, -1, 0) x (1, 0, 0)
  line L0 (0, 0) -> (0, 10) construction
  line L1 (0, 6) -> (390, 6) construction
  line L2 (390, 0) -> (390, 10) construction
  line L3 (195, -2) -> (195, 12) construction
  line L4 (0, 10) -> (390, 10) construction
  line L5 (0, 0) -> (390, 0) construction
  point P0 (195, 0)
  point P1 (60, 6)
  point P2 (330, 6)
  dimension "d95" = 270
  dimension "d103" = 6
hole "Hole10" at (-135, -100, 6) at (135, -100, 6) direction (0, 1, 0) diameter 3.242 depth 15 tip angle 118 thread size "M4x0.7" class "6H" standard "ISO Metric profile"
fillet "Fillet1" radius 2 4 edges at (-195, -100, 5) (195, -100, 5) (-195, 100, 5) (195, 100, 5)
equation "\"d33\" = d30"
equation "\"d36\" = d30"
properties part number "DLT-01-231B" material "Acrílico TP"
